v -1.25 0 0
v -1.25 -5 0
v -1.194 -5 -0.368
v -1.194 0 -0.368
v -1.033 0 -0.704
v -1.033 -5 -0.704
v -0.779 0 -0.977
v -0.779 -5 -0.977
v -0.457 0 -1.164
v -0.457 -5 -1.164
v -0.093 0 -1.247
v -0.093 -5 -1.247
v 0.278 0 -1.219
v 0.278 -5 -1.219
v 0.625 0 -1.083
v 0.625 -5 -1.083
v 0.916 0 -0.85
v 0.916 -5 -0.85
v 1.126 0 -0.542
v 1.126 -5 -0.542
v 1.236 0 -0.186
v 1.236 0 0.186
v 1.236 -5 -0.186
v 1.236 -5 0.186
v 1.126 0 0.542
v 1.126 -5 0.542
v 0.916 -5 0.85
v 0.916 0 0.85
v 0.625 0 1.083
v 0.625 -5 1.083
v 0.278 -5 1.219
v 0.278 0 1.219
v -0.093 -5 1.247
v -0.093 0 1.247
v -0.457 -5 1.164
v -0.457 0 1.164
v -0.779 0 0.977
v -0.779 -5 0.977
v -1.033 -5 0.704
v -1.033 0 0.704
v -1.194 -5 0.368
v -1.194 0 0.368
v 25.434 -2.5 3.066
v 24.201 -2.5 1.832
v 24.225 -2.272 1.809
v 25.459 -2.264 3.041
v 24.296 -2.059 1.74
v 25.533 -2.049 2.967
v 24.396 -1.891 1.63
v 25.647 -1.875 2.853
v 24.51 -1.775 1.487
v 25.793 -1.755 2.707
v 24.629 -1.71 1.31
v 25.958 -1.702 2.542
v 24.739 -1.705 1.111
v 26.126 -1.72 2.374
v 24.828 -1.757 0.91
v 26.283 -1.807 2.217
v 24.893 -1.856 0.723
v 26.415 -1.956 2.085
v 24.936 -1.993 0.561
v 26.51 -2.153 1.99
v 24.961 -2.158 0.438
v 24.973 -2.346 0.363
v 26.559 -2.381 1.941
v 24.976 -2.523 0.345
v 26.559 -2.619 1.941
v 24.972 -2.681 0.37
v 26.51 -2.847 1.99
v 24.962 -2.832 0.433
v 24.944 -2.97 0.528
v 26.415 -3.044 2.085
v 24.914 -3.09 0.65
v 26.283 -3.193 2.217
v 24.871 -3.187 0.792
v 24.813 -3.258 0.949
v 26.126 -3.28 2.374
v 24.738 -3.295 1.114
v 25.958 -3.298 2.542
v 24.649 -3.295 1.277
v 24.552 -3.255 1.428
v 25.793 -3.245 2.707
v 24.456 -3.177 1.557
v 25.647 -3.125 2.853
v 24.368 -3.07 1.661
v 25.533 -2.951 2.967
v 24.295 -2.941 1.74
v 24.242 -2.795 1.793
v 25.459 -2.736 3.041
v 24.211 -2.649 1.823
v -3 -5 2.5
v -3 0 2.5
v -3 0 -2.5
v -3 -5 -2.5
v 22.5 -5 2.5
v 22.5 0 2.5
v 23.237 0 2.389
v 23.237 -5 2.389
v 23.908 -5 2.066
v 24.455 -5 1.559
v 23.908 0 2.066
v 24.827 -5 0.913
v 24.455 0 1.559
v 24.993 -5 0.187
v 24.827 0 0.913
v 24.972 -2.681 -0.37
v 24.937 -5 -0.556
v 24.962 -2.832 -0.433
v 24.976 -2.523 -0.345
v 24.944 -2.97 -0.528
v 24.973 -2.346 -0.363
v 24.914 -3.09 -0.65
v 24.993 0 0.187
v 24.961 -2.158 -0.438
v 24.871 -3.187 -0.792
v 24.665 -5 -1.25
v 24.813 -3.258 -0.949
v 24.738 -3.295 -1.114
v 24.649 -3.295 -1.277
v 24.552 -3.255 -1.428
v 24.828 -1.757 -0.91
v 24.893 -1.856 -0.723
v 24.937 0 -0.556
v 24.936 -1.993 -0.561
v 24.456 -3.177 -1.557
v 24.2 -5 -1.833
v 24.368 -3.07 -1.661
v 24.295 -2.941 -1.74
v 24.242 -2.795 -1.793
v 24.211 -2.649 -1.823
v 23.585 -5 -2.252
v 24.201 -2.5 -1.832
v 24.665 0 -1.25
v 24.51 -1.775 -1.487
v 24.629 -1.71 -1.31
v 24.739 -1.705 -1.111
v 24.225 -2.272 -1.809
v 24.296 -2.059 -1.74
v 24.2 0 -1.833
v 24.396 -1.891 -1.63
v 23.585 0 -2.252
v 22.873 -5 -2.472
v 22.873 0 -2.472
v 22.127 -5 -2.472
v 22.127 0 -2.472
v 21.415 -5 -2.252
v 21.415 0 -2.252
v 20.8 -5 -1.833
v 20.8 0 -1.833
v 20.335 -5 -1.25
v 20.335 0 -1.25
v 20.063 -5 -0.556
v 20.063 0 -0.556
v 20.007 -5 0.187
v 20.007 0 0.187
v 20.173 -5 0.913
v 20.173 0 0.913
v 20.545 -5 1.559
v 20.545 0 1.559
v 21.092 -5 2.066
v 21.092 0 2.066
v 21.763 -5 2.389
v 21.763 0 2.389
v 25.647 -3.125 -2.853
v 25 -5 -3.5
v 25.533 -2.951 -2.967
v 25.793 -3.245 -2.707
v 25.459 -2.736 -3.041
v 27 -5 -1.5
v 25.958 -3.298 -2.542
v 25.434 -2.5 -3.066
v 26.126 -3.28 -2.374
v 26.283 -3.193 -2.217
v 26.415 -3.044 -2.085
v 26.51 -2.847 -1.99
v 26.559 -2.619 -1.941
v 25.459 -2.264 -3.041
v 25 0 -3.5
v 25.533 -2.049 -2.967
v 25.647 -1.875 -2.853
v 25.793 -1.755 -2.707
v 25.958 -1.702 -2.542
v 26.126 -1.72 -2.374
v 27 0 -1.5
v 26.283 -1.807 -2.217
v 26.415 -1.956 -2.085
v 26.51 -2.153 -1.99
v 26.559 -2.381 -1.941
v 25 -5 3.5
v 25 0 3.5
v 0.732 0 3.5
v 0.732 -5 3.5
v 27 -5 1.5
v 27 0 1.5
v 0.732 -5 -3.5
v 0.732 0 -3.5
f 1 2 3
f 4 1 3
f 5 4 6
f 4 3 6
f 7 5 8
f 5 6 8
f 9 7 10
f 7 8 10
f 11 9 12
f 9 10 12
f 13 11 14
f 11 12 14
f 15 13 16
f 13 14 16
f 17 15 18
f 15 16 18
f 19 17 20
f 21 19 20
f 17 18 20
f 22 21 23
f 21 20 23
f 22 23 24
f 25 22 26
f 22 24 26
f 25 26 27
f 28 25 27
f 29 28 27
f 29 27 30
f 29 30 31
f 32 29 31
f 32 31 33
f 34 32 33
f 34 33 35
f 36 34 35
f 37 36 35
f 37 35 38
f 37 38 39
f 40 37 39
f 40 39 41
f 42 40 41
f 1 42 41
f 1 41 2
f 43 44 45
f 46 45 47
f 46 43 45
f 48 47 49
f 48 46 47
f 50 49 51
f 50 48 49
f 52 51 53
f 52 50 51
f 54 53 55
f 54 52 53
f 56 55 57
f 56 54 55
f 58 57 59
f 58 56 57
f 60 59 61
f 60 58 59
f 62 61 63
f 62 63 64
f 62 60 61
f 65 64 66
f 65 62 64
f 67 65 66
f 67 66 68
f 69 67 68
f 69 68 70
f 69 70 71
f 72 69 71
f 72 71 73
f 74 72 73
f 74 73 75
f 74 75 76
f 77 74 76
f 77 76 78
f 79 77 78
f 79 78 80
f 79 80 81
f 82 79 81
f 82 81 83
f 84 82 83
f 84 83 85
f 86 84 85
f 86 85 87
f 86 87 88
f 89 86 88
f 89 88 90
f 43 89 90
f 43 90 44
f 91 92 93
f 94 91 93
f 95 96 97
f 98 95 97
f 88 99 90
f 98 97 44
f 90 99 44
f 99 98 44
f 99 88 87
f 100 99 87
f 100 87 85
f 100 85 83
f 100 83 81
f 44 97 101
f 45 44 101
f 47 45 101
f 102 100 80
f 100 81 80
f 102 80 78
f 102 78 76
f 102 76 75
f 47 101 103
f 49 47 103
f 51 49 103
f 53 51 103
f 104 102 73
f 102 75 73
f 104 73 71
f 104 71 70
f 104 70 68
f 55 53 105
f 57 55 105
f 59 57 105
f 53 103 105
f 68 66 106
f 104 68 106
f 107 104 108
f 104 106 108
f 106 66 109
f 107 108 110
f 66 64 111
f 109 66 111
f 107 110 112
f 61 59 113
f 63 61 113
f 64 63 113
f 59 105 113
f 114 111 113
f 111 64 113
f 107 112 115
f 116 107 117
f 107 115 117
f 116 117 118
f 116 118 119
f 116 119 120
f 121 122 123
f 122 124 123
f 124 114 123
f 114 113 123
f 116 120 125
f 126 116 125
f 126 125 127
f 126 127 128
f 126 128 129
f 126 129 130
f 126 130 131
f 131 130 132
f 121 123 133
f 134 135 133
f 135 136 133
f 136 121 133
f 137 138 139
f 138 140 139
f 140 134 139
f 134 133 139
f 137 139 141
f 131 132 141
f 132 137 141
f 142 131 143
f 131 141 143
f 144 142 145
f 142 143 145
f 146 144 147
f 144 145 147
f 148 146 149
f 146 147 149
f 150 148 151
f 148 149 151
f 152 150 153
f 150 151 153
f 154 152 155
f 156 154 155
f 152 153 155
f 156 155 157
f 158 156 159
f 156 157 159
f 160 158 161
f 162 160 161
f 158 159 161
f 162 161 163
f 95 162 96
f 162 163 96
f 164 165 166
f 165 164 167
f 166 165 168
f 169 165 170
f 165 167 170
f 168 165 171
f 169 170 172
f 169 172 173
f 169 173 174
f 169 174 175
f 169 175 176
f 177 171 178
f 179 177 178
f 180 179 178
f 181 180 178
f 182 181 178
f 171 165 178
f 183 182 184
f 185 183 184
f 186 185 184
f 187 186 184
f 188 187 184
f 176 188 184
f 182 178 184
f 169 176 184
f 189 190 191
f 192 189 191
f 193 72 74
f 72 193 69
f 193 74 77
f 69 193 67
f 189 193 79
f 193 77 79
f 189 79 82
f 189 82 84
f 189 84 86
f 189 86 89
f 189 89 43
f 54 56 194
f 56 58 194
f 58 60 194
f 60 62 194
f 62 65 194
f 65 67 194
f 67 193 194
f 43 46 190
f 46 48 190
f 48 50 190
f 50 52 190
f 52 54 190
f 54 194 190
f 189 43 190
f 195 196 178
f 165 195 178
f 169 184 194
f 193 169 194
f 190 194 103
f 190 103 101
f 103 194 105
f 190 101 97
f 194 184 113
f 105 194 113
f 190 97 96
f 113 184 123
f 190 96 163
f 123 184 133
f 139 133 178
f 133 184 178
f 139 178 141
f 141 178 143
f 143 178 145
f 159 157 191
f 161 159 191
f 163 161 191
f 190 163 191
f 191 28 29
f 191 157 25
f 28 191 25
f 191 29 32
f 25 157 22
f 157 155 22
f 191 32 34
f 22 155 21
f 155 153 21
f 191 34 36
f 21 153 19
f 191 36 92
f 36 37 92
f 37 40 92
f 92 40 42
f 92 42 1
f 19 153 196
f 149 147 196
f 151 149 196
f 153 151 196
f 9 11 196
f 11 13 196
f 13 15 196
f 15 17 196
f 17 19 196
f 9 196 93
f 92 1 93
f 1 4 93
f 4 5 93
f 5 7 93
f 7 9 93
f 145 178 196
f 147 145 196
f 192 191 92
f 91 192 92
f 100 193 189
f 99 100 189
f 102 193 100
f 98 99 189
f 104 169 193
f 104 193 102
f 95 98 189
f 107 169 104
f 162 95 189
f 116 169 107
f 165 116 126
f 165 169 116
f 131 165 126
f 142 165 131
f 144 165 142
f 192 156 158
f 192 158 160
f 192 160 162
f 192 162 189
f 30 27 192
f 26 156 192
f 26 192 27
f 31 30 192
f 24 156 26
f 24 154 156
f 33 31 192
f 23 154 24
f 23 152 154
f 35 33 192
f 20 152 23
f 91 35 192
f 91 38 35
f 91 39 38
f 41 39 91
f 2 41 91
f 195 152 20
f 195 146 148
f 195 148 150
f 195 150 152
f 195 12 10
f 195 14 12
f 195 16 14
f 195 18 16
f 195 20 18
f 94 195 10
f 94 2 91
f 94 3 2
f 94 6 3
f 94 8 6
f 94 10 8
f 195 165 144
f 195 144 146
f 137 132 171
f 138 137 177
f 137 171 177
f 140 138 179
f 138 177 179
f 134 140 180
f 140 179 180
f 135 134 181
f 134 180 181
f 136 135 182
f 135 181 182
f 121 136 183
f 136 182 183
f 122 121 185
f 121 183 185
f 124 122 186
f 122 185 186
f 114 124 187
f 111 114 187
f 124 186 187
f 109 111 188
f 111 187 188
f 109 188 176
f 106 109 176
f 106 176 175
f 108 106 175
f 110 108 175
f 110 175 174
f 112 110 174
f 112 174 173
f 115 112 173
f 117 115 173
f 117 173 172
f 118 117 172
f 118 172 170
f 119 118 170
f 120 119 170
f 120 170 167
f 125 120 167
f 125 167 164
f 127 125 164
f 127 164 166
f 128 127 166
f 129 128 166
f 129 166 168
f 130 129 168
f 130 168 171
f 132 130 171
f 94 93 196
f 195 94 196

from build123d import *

# Parameters (mm, degrees)
BLOCK_R                = 2.5
BOSS_EXTRUDE1_DEPTH    = 5
M3_TAPPED_HOLE1_D      = 2.5
M2_TAPPED_HOLE1_REACH  = 27.251
M2_TAPPED_HOLE1_BORE_R = 0.8


with BuildPart() as part:
    # block → Boss-Extrude1 (new body)
    with BuildSketch(Plane(origin=(0, 0, 0), x_dir=(1, 0, 0), z_dir=(0, 1, 0))):
        Polygon((0.732050808, 3.5), (25, 3.5), (27, 1.5), (27, -1.5), (25, -3.5), (0.732050808, -3.5), (-3, -2.5), (-3, 2.5), align=None)
        with Locations(Location((22.5, 0, 0), (0, 0, 270))):
            Circle(BLOCK_R, mode=Mode.SUBTRACT)
    extrude(amount=-BOSS_EXTRUDE1_DEPTH)

    # M3 Tapped Hole1 (through all)
    with Locations(Plane(origin=(0, 0, 0), x_dir=(1, 0, 0), z_dir=(0, 1, 0))):
        with Locations((0, 0)):
            Hole(M3_TAPPED_HOLE1_D / 2)

    # M2 Tapped Hole1 bore → M2 Tapped Hole1 (cut, up to next)
    with BuildSketch(Plane(origin=(14.25, 0, -14.25), x_dir=(-0.7071067811865465, 0, -0.7071067811865486), z_dir=(0.7071067811865486, 0, -0.7071067811865465)), mode=Mode.PRIVATE) as m2_tapped_hole1_sk1:
        with Locations((-16.617009358, -2.5)):
            Circle(M2_TAPPED_HOLE1_BORE_R)
    m2_tapped_hole1_tool1 = extrude(m2_tapped_hole1_sk1.sketch, amount=-M2_TAPPED_HOLE1_REACH, mode=Mode.PRIVATE) & part.part
    m2_tapped_hole1 = m2_tapped_hole1_tool1.solids().sort_by_distance((26, -2.5, -2.5))[0]
    add(m2_tapped_hole1, mode=Mode.SUBTRACT)

    # Mirror1: M2 Tapped Hole1 across plane
    add(m2_tapped_hole1.mirror(Plane.XY), mode=Mode.SUBTRACT)


solid = part.part
